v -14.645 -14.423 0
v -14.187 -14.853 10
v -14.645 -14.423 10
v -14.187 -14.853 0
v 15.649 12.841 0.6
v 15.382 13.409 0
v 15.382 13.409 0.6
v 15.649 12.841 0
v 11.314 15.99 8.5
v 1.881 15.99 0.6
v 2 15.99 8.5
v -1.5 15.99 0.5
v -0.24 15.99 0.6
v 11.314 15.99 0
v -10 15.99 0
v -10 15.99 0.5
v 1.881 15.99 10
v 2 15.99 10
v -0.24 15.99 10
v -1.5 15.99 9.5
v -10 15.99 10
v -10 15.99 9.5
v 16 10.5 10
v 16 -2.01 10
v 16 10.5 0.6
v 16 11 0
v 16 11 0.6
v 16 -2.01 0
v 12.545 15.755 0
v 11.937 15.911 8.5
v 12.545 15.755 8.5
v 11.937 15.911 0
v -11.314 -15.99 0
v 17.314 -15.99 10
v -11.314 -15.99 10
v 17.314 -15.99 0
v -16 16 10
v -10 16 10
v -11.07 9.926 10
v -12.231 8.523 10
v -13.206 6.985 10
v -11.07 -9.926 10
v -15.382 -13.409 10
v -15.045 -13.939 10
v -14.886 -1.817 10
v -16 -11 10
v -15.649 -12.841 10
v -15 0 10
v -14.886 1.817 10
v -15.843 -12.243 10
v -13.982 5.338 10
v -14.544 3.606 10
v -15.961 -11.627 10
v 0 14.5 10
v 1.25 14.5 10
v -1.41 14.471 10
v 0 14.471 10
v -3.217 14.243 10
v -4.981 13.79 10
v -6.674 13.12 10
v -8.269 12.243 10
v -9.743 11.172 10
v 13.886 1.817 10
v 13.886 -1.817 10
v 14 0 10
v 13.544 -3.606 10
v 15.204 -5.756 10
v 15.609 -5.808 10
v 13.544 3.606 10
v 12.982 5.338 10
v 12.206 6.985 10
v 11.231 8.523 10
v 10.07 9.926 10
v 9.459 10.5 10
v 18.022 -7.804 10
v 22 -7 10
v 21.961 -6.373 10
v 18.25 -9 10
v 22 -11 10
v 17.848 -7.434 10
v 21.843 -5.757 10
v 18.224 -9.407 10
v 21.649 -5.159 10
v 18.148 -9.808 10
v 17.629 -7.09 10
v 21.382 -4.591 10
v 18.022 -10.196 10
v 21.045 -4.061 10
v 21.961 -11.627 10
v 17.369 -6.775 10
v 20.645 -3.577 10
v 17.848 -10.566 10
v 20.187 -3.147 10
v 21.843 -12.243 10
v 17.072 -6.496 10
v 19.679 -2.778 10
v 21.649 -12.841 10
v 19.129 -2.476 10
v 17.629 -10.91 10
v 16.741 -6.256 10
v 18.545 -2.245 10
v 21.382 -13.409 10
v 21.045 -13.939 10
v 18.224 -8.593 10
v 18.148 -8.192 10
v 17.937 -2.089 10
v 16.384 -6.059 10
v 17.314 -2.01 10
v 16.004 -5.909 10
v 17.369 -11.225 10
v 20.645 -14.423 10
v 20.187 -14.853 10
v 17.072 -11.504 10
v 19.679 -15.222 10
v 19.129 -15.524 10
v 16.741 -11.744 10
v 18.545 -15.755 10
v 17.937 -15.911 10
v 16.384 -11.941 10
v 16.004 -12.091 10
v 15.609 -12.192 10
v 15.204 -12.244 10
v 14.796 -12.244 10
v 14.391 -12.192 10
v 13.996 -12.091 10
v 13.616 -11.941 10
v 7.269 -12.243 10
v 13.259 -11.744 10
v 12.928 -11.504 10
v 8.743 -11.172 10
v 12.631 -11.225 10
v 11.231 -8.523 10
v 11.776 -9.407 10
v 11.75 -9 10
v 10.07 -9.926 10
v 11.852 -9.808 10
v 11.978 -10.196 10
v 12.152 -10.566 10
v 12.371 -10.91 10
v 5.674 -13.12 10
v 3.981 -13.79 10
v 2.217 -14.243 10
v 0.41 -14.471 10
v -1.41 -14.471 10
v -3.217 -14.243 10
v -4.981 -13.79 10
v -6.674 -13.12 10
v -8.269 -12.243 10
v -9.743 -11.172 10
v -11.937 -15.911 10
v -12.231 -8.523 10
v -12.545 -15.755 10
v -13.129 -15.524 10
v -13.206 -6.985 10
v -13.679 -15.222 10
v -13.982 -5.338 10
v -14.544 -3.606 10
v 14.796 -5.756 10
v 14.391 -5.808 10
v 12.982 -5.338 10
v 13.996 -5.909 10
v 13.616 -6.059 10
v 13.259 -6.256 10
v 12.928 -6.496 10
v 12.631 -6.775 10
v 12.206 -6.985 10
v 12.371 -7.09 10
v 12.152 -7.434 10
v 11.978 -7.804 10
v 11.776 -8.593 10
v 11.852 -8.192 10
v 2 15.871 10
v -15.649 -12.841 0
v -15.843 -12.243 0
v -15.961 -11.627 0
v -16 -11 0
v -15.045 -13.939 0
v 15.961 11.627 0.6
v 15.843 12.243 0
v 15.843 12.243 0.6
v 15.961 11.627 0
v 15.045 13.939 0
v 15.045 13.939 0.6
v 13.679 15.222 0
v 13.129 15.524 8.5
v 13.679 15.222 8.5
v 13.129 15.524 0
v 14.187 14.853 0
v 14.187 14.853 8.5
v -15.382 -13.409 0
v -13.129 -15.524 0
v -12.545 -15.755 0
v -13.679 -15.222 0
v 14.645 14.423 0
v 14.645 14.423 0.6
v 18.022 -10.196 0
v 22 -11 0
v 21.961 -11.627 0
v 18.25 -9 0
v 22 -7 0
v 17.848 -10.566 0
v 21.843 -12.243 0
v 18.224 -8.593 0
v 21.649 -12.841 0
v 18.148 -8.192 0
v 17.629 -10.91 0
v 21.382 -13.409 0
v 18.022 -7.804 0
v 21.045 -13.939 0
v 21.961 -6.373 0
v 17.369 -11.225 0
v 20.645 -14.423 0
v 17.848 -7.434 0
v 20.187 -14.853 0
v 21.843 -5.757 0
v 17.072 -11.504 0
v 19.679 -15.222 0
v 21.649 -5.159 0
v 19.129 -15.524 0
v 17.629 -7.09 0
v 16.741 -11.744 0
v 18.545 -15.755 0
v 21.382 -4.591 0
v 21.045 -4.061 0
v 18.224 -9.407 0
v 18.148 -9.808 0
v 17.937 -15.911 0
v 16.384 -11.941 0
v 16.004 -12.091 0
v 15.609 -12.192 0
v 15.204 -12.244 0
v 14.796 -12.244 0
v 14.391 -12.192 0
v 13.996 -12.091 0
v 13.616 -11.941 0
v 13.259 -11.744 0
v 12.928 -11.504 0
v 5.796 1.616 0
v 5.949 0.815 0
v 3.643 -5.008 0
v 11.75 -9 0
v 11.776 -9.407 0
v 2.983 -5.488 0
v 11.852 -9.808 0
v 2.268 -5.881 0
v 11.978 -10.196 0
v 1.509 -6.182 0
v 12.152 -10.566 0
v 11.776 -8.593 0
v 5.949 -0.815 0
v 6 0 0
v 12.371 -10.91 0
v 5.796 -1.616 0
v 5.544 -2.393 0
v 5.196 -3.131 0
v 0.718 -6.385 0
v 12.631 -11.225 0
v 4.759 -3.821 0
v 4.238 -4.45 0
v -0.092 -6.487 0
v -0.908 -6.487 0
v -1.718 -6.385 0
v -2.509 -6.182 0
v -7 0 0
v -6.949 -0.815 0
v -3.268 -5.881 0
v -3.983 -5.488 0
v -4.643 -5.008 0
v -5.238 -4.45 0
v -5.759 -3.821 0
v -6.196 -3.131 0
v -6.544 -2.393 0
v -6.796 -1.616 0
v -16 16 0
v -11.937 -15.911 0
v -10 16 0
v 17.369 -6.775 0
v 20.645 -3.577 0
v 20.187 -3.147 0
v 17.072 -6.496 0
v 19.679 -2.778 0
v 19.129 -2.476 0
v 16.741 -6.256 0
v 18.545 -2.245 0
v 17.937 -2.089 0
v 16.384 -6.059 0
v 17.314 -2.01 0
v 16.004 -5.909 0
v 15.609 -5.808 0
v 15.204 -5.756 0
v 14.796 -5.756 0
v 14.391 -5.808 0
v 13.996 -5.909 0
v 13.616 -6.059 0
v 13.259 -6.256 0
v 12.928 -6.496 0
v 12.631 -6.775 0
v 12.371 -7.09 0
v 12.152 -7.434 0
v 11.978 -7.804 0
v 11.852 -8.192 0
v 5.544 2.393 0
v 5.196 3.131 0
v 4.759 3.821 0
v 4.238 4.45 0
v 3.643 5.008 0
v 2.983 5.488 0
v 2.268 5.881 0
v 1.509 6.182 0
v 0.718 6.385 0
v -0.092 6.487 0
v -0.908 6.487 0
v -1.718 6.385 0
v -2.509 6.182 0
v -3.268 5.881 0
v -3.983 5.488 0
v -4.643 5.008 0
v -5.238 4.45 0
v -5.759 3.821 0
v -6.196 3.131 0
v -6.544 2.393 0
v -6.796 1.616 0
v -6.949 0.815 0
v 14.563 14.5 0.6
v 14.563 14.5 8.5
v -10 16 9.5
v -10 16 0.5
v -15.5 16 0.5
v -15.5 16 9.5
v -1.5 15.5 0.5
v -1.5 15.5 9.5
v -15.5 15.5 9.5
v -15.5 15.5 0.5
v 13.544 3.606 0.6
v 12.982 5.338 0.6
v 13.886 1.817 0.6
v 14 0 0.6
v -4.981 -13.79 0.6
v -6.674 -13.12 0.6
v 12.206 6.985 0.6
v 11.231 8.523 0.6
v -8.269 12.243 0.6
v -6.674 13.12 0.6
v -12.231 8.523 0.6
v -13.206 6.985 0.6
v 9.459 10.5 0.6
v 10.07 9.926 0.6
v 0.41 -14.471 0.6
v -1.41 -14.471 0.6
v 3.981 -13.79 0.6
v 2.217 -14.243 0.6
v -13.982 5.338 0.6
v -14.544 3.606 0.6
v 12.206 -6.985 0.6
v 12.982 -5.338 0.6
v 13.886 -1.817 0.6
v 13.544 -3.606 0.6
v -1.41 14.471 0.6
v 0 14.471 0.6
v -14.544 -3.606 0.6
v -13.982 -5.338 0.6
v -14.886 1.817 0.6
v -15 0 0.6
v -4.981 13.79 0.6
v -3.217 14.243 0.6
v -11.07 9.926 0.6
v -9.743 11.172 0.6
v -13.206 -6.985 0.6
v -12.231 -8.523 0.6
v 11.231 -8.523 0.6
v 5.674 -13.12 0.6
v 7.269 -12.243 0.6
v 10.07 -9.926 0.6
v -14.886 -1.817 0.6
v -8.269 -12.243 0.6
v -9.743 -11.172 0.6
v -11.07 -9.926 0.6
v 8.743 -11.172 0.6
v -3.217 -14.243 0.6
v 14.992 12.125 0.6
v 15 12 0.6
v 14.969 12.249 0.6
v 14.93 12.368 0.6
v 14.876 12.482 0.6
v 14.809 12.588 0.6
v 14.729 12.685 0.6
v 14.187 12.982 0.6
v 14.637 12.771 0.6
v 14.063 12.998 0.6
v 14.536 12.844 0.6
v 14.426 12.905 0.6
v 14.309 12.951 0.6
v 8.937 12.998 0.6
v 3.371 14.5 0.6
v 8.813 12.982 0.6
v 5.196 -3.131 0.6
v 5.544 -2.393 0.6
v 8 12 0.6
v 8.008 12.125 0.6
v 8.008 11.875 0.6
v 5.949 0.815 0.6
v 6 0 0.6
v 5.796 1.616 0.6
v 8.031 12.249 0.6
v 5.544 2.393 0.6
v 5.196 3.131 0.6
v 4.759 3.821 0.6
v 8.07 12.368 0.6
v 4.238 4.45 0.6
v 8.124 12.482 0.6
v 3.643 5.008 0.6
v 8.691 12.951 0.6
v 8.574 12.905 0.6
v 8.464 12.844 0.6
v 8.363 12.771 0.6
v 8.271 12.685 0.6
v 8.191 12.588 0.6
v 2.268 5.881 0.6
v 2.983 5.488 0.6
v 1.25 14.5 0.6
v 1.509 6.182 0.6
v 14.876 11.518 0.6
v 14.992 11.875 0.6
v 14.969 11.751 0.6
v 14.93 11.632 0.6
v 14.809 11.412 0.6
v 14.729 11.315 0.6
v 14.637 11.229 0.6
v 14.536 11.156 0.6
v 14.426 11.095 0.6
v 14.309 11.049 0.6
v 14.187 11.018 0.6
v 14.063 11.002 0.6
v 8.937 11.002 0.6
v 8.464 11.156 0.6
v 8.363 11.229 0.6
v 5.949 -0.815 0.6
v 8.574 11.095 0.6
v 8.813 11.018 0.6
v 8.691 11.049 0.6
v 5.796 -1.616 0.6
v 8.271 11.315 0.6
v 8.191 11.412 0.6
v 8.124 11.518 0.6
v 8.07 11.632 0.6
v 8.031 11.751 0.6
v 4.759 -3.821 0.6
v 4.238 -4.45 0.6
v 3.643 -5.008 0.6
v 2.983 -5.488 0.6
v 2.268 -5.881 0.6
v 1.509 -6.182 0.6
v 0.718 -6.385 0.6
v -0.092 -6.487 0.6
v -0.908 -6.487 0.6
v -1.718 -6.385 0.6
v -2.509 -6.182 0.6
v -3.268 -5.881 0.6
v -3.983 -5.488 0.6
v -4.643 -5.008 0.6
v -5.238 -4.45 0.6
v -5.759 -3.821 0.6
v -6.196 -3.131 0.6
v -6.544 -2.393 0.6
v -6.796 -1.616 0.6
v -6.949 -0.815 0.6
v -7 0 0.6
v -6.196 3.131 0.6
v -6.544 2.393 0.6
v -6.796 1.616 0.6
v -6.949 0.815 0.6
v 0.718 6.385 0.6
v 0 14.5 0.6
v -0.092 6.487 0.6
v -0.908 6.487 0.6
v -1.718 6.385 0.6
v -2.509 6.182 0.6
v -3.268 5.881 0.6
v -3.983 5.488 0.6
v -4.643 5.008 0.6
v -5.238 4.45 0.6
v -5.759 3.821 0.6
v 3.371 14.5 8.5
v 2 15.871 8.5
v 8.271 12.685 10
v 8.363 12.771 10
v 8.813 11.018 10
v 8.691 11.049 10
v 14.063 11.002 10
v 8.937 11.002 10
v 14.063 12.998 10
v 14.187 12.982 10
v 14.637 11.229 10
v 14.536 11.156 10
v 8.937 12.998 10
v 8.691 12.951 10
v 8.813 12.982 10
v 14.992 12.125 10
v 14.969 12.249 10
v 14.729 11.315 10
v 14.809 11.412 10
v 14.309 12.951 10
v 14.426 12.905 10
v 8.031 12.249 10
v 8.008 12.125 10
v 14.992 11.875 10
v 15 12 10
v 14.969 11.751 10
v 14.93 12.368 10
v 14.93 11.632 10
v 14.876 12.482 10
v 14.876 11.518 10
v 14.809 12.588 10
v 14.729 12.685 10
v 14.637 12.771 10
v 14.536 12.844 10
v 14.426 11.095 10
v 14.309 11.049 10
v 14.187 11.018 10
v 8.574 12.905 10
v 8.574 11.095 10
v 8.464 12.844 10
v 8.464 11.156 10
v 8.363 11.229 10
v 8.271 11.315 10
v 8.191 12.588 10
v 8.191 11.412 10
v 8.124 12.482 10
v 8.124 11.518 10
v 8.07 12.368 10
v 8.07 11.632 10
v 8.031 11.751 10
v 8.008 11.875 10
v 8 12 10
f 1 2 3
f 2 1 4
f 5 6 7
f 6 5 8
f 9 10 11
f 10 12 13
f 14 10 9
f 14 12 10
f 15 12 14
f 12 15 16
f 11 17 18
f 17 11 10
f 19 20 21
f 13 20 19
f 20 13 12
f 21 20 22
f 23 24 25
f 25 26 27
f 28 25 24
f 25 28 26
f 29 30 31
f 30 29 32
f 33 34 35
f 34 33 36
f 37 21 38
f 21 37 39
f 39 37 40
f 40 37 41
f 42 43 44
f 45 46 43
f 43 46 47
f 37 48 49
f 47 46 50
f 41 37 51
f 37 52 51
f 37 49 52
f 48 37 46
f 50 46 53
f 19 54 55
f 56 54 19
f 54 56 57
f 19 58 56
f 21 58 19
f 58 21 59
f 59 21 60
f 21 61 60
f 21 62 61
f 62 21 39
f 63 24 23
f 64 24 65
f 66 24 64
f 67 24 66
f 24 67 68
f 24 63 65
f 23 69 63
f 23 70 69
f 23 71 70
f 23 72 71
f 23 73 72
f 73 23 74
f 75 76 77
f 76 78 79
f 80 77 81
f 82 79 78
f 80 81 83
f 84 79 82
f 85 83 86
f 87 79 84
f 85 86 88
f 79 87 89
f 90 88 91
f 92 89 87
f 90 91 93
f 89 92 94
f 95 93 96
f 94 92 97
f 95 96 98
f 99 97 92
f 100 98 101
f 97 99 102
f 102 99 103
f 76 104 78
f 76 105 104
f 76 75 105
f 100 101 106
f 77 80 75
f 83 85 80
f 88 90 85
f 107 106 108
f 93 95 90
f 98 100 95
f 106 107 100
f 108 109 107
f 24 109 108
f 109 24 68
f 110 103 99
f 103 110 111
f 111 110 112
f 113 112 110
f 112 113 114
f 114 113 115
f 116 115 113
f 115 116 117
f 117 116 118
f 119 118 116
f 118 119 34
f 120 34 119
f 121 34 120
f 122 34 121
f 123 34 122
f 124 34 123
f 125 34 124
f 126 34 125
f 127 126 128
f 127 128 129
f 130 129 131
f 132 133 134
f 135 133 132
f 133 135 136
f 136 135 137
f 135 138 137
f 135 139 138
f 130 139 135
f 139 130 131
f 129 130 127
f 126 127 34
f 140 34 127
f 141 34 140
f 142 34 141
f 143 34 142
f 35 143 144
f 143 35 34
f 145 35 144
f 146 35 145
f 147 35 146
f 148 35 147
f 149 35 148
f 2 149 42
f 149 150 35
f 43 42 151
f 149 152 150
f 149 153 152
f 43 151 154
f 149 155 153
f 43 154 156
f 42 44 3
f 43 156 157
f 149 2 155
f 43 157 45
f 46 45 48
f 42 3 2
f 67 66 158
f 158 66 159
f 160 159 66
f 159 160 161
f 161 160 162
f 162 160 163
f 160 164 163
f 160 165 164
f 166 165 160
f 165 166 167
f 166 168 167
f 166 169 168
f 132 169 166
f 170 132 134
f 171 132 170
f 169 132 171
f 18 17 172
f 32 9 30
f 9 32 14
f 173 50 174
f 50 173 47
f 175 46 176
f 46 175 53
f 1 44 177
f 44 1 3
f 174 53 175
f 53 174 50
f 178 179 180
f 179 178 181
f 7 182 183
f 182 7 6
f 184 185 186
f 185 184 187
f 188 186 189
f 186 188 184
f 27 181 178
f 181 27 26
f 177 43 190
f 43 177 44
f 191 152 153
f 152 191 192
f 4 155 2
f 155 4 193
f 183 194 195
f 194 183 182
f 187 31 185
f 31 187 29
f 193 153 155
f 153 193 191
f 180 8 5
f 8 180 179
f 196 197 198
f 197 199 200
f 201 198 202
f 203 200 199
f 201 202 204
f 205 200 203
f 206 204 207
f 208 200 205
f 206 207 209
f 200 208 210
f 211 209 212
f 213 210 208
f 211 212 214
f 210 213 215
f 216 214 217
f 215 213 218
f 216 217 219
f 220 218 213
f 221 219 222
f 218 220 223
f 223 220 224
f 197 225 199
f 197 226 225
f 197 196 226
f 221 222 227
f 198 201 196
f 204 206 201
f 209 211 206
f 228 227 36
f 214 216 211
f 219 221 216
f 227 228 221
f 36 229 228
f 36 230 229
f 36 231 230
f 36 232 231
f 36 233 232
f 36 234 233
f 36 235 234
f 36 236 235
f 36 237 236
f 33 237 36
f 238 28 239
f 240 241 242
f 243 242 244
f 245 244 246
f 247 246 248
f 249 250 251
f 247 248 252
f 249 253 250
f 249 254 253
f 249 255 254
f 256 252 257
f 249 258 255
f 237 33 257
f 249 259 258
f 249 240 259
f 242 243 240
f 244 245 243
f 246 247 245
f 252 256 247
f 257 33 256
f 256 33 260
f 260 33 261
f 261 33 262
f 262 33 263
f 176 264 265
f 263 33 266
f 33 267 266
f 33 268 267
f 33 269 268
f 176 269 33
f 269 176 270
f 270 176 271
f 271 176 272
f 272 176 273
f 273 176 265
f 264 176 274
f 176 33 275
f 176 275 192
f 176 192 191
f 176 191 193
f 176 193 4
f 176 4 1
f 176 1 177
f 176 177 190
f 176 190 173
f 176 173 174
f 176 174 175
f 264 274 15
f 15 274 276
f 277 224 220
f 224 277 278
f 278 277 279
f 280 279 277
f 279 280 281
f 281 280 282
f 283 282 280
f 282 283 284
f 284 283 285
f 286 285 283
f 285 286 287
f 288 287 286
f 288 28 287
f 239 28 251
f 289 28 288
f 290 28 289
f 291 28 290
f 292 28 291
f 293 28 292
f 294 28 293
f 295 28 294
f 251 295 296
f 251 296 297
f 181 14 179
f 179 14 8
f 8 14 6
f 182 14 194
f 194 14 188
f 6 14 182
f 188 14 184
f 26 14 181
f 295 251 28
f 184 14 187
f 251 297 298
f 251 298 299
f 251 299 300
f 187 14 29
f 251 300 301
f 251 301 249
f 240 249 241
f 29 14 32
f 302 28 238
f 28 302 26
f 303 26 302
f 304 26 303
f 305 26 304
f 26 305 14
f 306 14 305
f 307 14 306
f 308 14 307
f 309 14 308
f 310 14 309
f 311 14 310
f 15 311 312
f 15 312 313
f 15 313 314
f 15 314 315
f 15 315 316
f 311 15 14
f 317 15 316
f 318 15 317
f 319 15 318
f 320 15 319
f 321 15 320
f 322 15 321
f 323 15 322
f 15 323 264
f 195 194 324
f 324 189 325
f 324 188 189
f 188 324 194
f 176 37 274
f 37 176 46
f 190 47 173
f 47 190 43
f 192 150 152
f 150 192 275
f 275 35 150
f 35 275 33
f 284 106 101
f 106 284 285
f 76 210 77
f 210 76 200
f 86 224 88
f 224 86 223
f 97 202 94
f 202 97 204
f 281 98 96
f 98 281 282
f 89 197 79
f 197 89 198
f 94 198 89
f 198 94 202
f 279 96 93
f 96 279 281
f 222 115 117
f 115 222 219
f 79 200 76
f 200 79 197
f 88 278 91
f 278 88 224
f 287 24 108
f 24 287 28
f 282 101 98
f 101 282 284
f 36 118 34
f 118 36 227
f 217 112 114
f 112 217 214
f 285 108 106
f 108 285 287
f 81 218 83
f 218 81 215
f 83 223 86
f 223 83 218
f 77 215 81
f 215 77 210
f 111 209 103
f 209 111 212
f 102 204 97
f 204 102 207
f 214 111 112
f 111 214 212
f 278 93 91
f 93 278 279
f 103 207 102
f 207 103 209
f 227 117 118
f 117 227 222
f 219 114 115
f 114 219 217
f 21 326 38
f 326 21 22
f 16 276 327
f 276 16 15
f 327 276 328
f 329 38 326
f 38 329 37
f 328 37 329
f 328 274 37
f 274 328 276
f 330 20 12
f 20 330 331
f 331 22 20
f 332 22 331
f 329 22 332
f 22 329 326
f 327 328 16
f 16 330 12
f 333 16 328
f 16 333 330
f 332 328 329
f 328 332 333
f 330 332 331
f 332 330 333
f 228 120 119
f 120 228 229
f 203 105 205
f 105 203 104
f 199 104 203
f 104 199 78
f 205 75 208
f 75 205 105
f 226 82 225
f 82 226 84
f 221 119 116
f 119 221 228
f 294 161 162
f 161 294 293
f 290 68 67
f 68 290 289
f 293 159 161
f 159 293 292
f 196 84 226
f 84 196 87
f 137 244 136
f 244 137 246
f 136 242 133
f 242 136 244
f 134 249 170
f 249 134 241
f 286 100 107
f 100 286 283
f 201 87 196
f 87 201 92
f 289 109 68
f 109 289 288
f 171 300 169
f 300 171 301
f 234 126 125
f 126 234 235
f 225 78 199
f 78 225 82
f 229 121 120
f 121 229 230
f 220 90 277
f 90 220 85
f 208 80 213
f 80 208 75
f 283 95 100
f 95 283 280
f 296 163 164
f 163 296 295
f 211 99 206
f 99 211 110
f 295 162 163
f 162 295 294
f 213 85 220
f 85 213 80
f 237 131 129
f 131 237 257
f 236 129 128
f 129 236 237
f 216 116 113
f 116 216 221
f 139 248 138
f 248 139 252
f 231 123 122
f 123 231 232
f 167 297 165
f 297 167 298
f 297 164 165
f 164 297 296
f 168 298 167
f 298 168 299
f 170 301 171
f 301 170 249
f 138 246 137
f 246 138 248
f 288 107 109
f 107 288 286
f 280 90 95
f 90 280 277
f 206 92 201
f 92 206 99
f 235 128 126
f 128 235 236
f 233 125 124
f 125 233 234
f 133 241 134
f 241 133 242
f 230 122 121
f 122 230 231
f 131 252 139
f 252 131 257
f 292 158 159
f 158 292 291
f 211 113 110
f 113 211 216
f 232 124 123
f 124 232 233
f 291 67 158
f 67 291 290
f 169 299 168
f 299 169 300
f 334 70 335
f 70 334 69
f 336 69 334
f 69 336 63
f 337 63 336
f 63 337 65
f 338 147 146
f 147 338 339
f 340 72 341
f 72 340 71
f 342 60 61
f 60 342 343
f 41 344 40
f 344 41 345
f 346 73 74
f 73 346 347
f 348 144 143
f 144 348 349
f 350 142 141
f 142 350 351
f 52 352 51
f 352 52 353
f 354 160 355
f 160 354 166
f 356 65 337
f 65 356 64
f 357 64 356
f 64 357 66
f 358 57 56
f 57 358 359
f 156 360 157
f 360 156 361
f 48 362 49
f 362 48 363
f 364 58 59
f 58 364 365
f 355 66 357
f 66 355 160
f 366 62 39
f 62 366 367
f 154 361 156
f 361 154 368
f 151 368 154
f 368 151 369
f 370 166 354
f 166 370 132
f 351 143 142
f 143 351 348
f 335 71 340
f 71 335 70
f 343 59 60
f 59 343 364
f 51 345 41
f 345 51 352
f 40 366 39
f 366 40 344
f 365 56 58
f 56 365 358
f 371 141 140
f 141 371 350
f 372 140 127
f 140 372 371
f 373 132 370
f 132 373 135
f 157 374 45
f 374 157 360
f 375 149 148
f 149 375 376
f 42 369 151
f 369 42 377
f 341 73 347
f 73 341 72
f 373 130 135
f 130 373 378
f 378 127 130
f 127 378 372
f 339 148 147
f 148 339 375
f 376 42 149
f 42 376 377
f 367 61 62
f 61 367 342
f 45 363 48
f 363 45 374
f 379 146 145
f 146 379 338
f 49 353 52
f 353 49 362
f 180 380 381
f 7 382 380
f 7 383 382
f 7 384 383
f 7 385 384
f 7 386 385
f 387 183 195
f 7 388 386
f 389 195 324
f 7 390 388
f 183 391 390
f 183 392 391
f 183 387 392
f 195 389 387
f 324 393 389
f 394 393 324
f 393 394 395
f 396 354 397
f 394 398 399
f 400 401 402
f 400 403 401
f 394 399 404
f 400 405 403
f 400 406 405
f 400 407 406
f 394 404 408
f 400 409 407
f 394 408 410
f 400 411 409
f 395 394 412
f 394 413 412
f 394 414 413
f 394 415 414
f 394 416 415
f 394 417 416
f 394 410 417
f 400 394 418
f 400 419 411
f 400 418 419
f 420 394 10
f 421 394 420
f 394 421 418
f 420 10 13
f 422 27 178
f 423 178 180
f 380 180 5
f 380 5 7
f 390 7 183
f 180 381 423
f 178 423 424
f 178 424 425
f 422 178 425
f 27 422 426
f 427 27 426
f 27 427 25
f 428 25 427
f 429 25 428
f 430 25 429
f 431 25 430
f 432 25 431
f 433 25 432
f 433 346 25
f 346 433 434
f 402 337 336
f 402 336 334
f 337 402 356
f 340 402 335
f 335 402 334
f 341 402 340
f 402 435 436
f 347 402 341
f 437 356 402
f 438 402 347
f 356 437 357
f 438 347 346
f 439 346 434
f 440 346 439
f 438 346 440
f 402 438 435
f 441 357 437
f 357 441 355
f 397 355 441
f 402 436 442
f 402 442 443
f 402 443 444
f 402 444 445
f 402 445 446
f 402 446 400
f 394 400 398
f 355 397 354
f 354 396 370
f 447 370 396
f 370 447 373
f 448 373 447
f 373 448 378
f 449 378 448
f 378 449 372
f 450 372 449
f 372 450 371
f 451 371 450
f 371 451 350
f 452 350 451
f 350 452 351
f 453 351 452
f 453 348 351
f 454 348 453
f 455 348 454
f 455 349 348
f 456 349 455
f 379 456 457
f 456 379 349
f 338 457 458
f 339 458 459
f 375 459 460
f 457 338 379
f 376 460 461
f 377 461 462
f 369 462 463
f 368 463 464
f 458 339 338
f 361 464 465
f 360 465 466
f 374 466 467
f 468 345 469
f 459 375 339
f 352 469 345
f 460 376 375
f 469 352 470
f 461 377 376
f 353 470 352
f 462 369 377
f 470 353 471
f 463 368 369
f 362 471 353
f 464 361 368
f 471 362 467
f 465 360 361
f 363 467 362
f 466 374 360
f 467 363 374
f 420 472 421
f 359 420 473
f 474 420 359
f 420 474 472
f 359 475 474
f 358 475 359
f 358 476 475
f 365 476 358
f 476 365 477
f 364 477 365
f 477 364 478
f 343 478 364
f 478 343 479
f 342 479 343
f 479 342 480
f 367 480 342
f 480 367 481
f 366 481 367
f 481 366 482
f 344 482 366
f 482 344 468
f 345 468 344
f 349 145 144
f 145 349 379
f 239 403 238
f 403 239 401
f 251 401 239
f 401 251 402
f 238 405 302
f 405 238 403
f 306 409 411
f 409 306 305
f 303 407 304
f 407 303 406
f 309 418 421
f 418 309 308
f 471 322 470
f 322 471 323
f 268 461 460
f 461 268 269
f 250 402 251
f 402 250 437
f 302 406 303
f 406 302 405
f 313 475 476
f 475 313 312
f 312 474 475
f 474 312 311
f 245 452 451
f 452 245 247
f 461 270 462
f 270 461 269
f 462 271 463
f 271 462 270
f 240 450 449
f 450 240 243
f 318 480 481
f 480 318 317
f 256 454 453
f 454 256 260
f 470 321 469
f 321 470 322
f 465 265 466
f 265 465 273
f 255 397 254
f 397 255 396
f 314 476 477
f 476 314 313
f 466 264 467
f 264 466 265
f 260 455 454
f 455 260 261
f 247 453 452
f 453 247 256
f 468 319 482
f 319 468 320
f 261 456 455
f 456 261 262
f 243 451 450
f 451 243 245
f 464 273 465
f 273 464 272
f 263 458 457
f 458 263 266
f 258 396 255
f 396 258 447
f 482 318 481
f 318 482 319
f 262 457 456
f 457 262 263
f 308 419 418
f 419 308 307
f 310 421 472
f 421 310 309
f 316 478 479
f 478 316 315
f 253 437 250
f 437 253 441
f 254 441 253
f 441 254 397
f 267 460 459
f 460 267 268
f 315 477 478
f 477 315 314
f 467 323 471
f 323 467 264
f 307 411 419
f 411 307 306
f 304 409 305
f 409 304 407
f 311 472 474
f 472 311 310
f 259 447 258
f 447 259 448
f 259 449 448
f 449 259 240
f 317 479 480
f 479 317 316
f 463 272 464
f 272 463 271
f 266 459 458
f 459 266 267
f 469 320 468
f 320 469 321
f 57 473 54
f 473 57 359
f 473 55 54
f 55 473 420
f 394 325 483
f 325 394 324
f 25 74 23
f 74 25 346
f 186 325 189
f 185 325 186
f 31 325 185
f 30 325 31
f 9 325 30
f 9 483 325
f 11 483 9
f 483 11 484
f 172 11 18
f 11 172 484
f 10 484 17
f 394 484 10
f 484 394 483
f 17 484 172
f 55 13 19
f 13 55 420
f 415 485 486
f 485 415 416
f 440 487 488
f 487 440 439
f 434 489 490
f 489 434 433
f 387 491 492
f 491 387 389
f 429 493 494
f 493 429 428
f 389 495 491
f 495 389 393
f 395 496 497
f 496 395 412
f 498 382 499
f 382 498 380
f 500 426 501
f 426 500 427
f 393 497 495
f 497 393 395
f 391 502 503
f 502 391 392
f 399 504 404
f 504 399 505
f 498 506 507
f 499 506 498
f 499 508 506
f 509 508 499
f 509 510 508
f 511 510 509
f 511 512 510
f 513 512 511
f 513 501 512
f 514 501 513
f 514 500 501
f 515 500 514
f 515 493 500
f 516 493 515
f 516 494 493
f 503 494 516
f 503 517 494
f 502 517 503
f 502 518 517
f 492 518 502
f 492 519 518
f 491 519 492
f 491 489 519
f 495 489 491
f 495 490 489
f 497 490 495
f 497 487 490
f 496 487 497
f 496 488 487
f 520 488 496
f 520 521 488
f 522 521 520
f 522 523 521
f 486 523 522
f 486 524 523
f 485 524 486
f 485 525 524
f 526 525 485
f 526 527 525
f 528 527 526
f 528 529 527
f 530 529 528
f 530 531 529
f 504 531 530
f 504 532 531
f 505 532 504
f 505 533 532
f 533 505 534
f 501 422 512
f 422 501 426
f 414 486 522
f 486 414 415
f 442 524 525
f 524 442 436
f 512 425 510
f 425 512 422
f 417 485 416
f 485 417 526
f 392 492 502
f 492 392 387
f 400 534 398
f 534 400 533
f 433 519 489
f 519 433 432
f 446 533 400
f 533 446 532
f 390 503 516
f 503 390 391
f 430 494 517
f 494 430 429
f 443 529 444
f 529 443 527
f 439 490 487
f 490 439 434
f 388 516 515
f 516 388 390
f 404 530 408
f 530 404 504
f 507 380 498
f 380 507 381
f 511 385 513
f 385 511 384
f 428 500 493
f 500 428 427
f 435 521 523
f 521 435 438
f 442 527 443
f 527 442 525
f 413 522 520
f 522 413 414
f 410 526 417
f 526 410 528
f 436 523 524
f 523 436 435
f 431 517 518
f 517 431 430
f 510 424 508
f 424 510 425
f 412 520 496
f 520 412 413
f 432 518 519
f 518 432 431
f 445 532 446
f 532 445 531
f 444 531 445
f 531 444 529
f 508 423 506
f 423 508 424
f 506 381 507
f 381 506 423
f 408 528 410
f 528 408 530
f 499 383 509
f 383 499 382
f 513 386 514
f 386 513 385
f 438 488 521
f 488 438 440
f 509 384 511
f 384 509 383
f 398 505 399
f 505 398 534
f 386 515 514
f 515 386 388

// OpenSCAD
$fn = 50;


union() {
	difference() {
		union() {
			translate(v = [0, 0, 0]) {
				rotate(a = [0, 0, 0]) {
					hull() {
						translate(v = [-11.0000000000, 11.0000000000, 0]) {
							rotate(a = [0, 0, 0]) {
								translate(v = [0, 0, 0]) {
									rotate(a = [0, 0, 0]) {
										cylinder(h = 10, r = 5);
									}
								}
							}
						}
						translate(v = [11.0000000000, 11.0000000000, 0]) {
							rotate(a = [0, 0, 0]) {
								translate(v = [0, 0, 0]) {
									rotate(a = [0, 0, 0]) {
										cylinder(h = 10, r = 5);
									}
								}
							}
						}
						translate(v = [-11.0000000000, -11.0000000000, 0]) {
							rotate(a = [0, 0, 0]) {
								translate(v = [0, 0, 0]) {
									rotate(a = [0, 0, 0]) {
										cylinder(h = 10, r = 5);
									}
								}
							}
						}
						translate(v = [11.0000000000, -11.0000000000, 0]) {
							rotate(a = [0, 0, 0]) {
								translate(v = [0, 0, 0]) {
									rotate(a = [0, 0, 0]) {
										cylinder(h = 10, r = 5);
									}
								}
							}
						}
					}
				}
			}
			translate(v = [7.5000000000, -9.0000000000, 0]) {
				rotate(a = [0, 0, 0]) {
					hull() {
						translate(v = [-9.5000000000, 2.0000000000, 0]) {
							rotate(a = [0, 0, 0]) {
								translate(v = [0, 0, 0]) {
									rotate(a = [0, 0, 0]) {
										cylinder(h = 10, r = 5);
									}
								}
							}
						}
						translate(v = [9.5000000000, 2.0000000000, 0]) {
							rotate(a = [0, 0, 0]) {
								translate(v = [0, 0, 0]) {
									rotate(a = [0, 0, 0]) {
										cylinder(h = 10, r = 5);
									}
								}
							}
						}
						translate(v = [-9.5000000000, -2.0000000000, 0]) {
							rotate(a = [0, 0, 0]) {
								translate(v = [0, 0, 0]) {
									rotate(a = [0, 0, 0]) {
										cylinder(h = 10, r = 5);
									}
								}
							}
						}
						translate(v = [9.5000000000, -2.0000000000, 0]) {
							rotate(a = [0, 0, 0]) {
								translate(v = [0, 0, 0]) {
									rotate(a = [0, 0, 0]) {
										cylinder(h = 10, r = 5);
									}
								}
							}
						}
					}
				}
			}
			translate(v = [-16.0000000000, 10.0000000000, 0]) {
				rotate(a = [0, 0, 0]) {
					cube(size = [6, 6, 10]);
				}
			}
		}
		union() {
			translate(v = [-15.5000000000, 15.5000000000, 0.5000000000]) {
				rotate(a = [0, 0, 0]) {
					cube(size = [14, 0.5000000000, 9.0000000000]);
				}
			}
			translate(v = [15.0000000000, -9.0000000000, -125.0000000000]) {
				rotate(a = [0, 0, 0]) {
					cylinder(h = 250, r = 3.2500000000);
				}
			}
			translate(v = [-0.5000000000, 0.0000000000, 0.6000000000]) {
				rotate(a = [0, 0, 0]) {
					cylinder(h = 12.4000000000, r = 14.5000000000);
				}
			}
			translate(v = [-0.5000000000, 0.0000000000, -5.0000000000]) {
				rotate(a = [0, 0, 0]) {
					cylinder(h = 10, r = 6.5000000000);
				}
			}
			translate(v = [0.0000000000, 10.5000000000, 0.6000000000]) {
				rotate(a = [0, 0, 0]) {
					cube(size = [16.0000000000, 4, 12.4000000000]);
				}
			}
			translate(v = [2.0000000000, 10.5000000000, 8.5000000000]) {
				rotate(a = [0, 0, 0]) {
					cube(size = [14.0000000000, 7, 1.5000000000]);
				}
			}
			translate(v = [-3.0000000000, 18.7500000000, 0.6000000000]) {
				rotate(a = [0, 0, -45]) {
					cube(size = [10, 1.5000000000, 12.4000000000]);
				}
			}
			translate(v = [2.2500000000, 11.0000000000, 0.6000000000]) {
				rotate(a = [0, 0, 0]) {
					cube(size = [7.5000000000, 2, 9.4000000000]);
				}
			}
		}
	}
	union() {
		translate(v = [11.5000000000, 12, 0]) {
			rotate(a = [0, 0, 0]) {
				hull() {
					translate(v = [2.5000000000, 0, 0]) {
						rotate(a = [0, 0, 0]) {
							translate(v = [0, 0, 0]) {
								rotate(a = [0, 0, 0]) {
									cylinder(h = 10, r = 1.0000000000);
								}
							}
						}
					}
					translate(v = [-2.5000000000, 0, 0]) {
						rotate(a = [0, 0, 0]) {
							translate(v = [0, 0, 0]) {
								rotate(a = [0, 0, 0]) {
									cylinder(h = 10, r = 1.0000000000);
								}
							}
						}
					}
				}
			}
		}
	}
}
